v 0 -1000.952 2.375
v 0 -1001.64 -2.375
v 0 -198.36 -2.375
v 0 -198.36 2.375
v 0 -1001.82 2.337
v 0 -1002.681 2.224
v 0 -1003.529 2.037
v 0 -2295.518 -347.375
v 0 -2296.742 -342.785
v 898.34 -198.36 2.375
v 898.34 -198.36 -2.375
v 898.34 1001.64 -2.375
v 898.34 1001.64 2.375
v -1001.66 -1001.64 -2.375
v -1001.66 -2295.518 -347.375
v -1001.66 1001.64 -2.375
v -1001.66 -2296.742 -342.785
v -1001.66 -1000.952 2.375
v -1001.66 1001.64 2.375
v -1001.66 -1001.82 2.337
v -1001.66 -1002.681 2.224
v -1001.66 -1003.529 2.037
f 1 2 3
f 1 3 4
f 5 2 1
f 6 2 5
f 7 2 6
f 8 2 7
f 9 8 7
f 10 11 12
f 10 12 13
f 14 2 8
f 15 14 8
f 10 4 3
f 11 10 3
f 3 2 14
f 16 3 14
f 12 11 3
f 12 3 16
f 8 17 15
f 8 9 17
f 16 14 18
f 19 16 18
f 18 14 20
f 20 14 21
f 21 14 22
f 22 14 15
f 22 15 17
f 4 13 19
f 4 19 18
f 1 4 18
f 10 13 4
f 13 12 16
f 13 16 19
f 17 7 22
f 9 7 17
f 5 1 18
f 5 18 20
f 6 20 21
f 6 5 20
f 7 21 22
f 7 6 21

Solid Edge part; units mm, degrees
sketch "Sketch1" plane through (0, 0, 0) normal (1, 0, 0) x (0, 1, 0)
  line L0 (-1001.64, -2.375) -> (1001.64, -2.375)
  line L1 (1001.64, -2.375) -> (1001.64, 2.375)
  line L2 (1001.64, 2.375) -> (-1000.9521, 2.375)
  arc A0 (-1000.9521, 2.375) -> (-1003.5285, 2.0374) centre (-1000.9521, -7.625) ccw
  line L3 (-1003.5285, 2.0374) -> (-2296.7423, -342.7854)
  line L4 (-2296.7423, -342.7854) -> (-2295.5185, -347.375)
  line L5 (-1001.64, -2.375) -> (-2295.5185, -347.375)
  dimension "D1" = 2003.28
  dimension "D2" = 4.75
  dimension "D3" = 4.75
  dimension "D4" = 345
extrude "Protrusion1" add sketch "Sketch1" against normal blind 1001.66
sketch "Sketch2" plane through (0, 0, 0) normal (1, 0, 0) x (0, 1, 0)
  line L0 (1001.64, 2.375) -> (-198.36, 2.375)
  line L1 (-198.36, 2.375) -> (-198.36, -2.375)
  line L2 (-198.36, -2.375) -> (1001.64, -2.375)
  line L3 (1001.64, -2.375) -> (1001.64, 2.375)
extrude "ExtrudedProtrusion_2" add sketch "Sketch2" along normal blind 898.34
